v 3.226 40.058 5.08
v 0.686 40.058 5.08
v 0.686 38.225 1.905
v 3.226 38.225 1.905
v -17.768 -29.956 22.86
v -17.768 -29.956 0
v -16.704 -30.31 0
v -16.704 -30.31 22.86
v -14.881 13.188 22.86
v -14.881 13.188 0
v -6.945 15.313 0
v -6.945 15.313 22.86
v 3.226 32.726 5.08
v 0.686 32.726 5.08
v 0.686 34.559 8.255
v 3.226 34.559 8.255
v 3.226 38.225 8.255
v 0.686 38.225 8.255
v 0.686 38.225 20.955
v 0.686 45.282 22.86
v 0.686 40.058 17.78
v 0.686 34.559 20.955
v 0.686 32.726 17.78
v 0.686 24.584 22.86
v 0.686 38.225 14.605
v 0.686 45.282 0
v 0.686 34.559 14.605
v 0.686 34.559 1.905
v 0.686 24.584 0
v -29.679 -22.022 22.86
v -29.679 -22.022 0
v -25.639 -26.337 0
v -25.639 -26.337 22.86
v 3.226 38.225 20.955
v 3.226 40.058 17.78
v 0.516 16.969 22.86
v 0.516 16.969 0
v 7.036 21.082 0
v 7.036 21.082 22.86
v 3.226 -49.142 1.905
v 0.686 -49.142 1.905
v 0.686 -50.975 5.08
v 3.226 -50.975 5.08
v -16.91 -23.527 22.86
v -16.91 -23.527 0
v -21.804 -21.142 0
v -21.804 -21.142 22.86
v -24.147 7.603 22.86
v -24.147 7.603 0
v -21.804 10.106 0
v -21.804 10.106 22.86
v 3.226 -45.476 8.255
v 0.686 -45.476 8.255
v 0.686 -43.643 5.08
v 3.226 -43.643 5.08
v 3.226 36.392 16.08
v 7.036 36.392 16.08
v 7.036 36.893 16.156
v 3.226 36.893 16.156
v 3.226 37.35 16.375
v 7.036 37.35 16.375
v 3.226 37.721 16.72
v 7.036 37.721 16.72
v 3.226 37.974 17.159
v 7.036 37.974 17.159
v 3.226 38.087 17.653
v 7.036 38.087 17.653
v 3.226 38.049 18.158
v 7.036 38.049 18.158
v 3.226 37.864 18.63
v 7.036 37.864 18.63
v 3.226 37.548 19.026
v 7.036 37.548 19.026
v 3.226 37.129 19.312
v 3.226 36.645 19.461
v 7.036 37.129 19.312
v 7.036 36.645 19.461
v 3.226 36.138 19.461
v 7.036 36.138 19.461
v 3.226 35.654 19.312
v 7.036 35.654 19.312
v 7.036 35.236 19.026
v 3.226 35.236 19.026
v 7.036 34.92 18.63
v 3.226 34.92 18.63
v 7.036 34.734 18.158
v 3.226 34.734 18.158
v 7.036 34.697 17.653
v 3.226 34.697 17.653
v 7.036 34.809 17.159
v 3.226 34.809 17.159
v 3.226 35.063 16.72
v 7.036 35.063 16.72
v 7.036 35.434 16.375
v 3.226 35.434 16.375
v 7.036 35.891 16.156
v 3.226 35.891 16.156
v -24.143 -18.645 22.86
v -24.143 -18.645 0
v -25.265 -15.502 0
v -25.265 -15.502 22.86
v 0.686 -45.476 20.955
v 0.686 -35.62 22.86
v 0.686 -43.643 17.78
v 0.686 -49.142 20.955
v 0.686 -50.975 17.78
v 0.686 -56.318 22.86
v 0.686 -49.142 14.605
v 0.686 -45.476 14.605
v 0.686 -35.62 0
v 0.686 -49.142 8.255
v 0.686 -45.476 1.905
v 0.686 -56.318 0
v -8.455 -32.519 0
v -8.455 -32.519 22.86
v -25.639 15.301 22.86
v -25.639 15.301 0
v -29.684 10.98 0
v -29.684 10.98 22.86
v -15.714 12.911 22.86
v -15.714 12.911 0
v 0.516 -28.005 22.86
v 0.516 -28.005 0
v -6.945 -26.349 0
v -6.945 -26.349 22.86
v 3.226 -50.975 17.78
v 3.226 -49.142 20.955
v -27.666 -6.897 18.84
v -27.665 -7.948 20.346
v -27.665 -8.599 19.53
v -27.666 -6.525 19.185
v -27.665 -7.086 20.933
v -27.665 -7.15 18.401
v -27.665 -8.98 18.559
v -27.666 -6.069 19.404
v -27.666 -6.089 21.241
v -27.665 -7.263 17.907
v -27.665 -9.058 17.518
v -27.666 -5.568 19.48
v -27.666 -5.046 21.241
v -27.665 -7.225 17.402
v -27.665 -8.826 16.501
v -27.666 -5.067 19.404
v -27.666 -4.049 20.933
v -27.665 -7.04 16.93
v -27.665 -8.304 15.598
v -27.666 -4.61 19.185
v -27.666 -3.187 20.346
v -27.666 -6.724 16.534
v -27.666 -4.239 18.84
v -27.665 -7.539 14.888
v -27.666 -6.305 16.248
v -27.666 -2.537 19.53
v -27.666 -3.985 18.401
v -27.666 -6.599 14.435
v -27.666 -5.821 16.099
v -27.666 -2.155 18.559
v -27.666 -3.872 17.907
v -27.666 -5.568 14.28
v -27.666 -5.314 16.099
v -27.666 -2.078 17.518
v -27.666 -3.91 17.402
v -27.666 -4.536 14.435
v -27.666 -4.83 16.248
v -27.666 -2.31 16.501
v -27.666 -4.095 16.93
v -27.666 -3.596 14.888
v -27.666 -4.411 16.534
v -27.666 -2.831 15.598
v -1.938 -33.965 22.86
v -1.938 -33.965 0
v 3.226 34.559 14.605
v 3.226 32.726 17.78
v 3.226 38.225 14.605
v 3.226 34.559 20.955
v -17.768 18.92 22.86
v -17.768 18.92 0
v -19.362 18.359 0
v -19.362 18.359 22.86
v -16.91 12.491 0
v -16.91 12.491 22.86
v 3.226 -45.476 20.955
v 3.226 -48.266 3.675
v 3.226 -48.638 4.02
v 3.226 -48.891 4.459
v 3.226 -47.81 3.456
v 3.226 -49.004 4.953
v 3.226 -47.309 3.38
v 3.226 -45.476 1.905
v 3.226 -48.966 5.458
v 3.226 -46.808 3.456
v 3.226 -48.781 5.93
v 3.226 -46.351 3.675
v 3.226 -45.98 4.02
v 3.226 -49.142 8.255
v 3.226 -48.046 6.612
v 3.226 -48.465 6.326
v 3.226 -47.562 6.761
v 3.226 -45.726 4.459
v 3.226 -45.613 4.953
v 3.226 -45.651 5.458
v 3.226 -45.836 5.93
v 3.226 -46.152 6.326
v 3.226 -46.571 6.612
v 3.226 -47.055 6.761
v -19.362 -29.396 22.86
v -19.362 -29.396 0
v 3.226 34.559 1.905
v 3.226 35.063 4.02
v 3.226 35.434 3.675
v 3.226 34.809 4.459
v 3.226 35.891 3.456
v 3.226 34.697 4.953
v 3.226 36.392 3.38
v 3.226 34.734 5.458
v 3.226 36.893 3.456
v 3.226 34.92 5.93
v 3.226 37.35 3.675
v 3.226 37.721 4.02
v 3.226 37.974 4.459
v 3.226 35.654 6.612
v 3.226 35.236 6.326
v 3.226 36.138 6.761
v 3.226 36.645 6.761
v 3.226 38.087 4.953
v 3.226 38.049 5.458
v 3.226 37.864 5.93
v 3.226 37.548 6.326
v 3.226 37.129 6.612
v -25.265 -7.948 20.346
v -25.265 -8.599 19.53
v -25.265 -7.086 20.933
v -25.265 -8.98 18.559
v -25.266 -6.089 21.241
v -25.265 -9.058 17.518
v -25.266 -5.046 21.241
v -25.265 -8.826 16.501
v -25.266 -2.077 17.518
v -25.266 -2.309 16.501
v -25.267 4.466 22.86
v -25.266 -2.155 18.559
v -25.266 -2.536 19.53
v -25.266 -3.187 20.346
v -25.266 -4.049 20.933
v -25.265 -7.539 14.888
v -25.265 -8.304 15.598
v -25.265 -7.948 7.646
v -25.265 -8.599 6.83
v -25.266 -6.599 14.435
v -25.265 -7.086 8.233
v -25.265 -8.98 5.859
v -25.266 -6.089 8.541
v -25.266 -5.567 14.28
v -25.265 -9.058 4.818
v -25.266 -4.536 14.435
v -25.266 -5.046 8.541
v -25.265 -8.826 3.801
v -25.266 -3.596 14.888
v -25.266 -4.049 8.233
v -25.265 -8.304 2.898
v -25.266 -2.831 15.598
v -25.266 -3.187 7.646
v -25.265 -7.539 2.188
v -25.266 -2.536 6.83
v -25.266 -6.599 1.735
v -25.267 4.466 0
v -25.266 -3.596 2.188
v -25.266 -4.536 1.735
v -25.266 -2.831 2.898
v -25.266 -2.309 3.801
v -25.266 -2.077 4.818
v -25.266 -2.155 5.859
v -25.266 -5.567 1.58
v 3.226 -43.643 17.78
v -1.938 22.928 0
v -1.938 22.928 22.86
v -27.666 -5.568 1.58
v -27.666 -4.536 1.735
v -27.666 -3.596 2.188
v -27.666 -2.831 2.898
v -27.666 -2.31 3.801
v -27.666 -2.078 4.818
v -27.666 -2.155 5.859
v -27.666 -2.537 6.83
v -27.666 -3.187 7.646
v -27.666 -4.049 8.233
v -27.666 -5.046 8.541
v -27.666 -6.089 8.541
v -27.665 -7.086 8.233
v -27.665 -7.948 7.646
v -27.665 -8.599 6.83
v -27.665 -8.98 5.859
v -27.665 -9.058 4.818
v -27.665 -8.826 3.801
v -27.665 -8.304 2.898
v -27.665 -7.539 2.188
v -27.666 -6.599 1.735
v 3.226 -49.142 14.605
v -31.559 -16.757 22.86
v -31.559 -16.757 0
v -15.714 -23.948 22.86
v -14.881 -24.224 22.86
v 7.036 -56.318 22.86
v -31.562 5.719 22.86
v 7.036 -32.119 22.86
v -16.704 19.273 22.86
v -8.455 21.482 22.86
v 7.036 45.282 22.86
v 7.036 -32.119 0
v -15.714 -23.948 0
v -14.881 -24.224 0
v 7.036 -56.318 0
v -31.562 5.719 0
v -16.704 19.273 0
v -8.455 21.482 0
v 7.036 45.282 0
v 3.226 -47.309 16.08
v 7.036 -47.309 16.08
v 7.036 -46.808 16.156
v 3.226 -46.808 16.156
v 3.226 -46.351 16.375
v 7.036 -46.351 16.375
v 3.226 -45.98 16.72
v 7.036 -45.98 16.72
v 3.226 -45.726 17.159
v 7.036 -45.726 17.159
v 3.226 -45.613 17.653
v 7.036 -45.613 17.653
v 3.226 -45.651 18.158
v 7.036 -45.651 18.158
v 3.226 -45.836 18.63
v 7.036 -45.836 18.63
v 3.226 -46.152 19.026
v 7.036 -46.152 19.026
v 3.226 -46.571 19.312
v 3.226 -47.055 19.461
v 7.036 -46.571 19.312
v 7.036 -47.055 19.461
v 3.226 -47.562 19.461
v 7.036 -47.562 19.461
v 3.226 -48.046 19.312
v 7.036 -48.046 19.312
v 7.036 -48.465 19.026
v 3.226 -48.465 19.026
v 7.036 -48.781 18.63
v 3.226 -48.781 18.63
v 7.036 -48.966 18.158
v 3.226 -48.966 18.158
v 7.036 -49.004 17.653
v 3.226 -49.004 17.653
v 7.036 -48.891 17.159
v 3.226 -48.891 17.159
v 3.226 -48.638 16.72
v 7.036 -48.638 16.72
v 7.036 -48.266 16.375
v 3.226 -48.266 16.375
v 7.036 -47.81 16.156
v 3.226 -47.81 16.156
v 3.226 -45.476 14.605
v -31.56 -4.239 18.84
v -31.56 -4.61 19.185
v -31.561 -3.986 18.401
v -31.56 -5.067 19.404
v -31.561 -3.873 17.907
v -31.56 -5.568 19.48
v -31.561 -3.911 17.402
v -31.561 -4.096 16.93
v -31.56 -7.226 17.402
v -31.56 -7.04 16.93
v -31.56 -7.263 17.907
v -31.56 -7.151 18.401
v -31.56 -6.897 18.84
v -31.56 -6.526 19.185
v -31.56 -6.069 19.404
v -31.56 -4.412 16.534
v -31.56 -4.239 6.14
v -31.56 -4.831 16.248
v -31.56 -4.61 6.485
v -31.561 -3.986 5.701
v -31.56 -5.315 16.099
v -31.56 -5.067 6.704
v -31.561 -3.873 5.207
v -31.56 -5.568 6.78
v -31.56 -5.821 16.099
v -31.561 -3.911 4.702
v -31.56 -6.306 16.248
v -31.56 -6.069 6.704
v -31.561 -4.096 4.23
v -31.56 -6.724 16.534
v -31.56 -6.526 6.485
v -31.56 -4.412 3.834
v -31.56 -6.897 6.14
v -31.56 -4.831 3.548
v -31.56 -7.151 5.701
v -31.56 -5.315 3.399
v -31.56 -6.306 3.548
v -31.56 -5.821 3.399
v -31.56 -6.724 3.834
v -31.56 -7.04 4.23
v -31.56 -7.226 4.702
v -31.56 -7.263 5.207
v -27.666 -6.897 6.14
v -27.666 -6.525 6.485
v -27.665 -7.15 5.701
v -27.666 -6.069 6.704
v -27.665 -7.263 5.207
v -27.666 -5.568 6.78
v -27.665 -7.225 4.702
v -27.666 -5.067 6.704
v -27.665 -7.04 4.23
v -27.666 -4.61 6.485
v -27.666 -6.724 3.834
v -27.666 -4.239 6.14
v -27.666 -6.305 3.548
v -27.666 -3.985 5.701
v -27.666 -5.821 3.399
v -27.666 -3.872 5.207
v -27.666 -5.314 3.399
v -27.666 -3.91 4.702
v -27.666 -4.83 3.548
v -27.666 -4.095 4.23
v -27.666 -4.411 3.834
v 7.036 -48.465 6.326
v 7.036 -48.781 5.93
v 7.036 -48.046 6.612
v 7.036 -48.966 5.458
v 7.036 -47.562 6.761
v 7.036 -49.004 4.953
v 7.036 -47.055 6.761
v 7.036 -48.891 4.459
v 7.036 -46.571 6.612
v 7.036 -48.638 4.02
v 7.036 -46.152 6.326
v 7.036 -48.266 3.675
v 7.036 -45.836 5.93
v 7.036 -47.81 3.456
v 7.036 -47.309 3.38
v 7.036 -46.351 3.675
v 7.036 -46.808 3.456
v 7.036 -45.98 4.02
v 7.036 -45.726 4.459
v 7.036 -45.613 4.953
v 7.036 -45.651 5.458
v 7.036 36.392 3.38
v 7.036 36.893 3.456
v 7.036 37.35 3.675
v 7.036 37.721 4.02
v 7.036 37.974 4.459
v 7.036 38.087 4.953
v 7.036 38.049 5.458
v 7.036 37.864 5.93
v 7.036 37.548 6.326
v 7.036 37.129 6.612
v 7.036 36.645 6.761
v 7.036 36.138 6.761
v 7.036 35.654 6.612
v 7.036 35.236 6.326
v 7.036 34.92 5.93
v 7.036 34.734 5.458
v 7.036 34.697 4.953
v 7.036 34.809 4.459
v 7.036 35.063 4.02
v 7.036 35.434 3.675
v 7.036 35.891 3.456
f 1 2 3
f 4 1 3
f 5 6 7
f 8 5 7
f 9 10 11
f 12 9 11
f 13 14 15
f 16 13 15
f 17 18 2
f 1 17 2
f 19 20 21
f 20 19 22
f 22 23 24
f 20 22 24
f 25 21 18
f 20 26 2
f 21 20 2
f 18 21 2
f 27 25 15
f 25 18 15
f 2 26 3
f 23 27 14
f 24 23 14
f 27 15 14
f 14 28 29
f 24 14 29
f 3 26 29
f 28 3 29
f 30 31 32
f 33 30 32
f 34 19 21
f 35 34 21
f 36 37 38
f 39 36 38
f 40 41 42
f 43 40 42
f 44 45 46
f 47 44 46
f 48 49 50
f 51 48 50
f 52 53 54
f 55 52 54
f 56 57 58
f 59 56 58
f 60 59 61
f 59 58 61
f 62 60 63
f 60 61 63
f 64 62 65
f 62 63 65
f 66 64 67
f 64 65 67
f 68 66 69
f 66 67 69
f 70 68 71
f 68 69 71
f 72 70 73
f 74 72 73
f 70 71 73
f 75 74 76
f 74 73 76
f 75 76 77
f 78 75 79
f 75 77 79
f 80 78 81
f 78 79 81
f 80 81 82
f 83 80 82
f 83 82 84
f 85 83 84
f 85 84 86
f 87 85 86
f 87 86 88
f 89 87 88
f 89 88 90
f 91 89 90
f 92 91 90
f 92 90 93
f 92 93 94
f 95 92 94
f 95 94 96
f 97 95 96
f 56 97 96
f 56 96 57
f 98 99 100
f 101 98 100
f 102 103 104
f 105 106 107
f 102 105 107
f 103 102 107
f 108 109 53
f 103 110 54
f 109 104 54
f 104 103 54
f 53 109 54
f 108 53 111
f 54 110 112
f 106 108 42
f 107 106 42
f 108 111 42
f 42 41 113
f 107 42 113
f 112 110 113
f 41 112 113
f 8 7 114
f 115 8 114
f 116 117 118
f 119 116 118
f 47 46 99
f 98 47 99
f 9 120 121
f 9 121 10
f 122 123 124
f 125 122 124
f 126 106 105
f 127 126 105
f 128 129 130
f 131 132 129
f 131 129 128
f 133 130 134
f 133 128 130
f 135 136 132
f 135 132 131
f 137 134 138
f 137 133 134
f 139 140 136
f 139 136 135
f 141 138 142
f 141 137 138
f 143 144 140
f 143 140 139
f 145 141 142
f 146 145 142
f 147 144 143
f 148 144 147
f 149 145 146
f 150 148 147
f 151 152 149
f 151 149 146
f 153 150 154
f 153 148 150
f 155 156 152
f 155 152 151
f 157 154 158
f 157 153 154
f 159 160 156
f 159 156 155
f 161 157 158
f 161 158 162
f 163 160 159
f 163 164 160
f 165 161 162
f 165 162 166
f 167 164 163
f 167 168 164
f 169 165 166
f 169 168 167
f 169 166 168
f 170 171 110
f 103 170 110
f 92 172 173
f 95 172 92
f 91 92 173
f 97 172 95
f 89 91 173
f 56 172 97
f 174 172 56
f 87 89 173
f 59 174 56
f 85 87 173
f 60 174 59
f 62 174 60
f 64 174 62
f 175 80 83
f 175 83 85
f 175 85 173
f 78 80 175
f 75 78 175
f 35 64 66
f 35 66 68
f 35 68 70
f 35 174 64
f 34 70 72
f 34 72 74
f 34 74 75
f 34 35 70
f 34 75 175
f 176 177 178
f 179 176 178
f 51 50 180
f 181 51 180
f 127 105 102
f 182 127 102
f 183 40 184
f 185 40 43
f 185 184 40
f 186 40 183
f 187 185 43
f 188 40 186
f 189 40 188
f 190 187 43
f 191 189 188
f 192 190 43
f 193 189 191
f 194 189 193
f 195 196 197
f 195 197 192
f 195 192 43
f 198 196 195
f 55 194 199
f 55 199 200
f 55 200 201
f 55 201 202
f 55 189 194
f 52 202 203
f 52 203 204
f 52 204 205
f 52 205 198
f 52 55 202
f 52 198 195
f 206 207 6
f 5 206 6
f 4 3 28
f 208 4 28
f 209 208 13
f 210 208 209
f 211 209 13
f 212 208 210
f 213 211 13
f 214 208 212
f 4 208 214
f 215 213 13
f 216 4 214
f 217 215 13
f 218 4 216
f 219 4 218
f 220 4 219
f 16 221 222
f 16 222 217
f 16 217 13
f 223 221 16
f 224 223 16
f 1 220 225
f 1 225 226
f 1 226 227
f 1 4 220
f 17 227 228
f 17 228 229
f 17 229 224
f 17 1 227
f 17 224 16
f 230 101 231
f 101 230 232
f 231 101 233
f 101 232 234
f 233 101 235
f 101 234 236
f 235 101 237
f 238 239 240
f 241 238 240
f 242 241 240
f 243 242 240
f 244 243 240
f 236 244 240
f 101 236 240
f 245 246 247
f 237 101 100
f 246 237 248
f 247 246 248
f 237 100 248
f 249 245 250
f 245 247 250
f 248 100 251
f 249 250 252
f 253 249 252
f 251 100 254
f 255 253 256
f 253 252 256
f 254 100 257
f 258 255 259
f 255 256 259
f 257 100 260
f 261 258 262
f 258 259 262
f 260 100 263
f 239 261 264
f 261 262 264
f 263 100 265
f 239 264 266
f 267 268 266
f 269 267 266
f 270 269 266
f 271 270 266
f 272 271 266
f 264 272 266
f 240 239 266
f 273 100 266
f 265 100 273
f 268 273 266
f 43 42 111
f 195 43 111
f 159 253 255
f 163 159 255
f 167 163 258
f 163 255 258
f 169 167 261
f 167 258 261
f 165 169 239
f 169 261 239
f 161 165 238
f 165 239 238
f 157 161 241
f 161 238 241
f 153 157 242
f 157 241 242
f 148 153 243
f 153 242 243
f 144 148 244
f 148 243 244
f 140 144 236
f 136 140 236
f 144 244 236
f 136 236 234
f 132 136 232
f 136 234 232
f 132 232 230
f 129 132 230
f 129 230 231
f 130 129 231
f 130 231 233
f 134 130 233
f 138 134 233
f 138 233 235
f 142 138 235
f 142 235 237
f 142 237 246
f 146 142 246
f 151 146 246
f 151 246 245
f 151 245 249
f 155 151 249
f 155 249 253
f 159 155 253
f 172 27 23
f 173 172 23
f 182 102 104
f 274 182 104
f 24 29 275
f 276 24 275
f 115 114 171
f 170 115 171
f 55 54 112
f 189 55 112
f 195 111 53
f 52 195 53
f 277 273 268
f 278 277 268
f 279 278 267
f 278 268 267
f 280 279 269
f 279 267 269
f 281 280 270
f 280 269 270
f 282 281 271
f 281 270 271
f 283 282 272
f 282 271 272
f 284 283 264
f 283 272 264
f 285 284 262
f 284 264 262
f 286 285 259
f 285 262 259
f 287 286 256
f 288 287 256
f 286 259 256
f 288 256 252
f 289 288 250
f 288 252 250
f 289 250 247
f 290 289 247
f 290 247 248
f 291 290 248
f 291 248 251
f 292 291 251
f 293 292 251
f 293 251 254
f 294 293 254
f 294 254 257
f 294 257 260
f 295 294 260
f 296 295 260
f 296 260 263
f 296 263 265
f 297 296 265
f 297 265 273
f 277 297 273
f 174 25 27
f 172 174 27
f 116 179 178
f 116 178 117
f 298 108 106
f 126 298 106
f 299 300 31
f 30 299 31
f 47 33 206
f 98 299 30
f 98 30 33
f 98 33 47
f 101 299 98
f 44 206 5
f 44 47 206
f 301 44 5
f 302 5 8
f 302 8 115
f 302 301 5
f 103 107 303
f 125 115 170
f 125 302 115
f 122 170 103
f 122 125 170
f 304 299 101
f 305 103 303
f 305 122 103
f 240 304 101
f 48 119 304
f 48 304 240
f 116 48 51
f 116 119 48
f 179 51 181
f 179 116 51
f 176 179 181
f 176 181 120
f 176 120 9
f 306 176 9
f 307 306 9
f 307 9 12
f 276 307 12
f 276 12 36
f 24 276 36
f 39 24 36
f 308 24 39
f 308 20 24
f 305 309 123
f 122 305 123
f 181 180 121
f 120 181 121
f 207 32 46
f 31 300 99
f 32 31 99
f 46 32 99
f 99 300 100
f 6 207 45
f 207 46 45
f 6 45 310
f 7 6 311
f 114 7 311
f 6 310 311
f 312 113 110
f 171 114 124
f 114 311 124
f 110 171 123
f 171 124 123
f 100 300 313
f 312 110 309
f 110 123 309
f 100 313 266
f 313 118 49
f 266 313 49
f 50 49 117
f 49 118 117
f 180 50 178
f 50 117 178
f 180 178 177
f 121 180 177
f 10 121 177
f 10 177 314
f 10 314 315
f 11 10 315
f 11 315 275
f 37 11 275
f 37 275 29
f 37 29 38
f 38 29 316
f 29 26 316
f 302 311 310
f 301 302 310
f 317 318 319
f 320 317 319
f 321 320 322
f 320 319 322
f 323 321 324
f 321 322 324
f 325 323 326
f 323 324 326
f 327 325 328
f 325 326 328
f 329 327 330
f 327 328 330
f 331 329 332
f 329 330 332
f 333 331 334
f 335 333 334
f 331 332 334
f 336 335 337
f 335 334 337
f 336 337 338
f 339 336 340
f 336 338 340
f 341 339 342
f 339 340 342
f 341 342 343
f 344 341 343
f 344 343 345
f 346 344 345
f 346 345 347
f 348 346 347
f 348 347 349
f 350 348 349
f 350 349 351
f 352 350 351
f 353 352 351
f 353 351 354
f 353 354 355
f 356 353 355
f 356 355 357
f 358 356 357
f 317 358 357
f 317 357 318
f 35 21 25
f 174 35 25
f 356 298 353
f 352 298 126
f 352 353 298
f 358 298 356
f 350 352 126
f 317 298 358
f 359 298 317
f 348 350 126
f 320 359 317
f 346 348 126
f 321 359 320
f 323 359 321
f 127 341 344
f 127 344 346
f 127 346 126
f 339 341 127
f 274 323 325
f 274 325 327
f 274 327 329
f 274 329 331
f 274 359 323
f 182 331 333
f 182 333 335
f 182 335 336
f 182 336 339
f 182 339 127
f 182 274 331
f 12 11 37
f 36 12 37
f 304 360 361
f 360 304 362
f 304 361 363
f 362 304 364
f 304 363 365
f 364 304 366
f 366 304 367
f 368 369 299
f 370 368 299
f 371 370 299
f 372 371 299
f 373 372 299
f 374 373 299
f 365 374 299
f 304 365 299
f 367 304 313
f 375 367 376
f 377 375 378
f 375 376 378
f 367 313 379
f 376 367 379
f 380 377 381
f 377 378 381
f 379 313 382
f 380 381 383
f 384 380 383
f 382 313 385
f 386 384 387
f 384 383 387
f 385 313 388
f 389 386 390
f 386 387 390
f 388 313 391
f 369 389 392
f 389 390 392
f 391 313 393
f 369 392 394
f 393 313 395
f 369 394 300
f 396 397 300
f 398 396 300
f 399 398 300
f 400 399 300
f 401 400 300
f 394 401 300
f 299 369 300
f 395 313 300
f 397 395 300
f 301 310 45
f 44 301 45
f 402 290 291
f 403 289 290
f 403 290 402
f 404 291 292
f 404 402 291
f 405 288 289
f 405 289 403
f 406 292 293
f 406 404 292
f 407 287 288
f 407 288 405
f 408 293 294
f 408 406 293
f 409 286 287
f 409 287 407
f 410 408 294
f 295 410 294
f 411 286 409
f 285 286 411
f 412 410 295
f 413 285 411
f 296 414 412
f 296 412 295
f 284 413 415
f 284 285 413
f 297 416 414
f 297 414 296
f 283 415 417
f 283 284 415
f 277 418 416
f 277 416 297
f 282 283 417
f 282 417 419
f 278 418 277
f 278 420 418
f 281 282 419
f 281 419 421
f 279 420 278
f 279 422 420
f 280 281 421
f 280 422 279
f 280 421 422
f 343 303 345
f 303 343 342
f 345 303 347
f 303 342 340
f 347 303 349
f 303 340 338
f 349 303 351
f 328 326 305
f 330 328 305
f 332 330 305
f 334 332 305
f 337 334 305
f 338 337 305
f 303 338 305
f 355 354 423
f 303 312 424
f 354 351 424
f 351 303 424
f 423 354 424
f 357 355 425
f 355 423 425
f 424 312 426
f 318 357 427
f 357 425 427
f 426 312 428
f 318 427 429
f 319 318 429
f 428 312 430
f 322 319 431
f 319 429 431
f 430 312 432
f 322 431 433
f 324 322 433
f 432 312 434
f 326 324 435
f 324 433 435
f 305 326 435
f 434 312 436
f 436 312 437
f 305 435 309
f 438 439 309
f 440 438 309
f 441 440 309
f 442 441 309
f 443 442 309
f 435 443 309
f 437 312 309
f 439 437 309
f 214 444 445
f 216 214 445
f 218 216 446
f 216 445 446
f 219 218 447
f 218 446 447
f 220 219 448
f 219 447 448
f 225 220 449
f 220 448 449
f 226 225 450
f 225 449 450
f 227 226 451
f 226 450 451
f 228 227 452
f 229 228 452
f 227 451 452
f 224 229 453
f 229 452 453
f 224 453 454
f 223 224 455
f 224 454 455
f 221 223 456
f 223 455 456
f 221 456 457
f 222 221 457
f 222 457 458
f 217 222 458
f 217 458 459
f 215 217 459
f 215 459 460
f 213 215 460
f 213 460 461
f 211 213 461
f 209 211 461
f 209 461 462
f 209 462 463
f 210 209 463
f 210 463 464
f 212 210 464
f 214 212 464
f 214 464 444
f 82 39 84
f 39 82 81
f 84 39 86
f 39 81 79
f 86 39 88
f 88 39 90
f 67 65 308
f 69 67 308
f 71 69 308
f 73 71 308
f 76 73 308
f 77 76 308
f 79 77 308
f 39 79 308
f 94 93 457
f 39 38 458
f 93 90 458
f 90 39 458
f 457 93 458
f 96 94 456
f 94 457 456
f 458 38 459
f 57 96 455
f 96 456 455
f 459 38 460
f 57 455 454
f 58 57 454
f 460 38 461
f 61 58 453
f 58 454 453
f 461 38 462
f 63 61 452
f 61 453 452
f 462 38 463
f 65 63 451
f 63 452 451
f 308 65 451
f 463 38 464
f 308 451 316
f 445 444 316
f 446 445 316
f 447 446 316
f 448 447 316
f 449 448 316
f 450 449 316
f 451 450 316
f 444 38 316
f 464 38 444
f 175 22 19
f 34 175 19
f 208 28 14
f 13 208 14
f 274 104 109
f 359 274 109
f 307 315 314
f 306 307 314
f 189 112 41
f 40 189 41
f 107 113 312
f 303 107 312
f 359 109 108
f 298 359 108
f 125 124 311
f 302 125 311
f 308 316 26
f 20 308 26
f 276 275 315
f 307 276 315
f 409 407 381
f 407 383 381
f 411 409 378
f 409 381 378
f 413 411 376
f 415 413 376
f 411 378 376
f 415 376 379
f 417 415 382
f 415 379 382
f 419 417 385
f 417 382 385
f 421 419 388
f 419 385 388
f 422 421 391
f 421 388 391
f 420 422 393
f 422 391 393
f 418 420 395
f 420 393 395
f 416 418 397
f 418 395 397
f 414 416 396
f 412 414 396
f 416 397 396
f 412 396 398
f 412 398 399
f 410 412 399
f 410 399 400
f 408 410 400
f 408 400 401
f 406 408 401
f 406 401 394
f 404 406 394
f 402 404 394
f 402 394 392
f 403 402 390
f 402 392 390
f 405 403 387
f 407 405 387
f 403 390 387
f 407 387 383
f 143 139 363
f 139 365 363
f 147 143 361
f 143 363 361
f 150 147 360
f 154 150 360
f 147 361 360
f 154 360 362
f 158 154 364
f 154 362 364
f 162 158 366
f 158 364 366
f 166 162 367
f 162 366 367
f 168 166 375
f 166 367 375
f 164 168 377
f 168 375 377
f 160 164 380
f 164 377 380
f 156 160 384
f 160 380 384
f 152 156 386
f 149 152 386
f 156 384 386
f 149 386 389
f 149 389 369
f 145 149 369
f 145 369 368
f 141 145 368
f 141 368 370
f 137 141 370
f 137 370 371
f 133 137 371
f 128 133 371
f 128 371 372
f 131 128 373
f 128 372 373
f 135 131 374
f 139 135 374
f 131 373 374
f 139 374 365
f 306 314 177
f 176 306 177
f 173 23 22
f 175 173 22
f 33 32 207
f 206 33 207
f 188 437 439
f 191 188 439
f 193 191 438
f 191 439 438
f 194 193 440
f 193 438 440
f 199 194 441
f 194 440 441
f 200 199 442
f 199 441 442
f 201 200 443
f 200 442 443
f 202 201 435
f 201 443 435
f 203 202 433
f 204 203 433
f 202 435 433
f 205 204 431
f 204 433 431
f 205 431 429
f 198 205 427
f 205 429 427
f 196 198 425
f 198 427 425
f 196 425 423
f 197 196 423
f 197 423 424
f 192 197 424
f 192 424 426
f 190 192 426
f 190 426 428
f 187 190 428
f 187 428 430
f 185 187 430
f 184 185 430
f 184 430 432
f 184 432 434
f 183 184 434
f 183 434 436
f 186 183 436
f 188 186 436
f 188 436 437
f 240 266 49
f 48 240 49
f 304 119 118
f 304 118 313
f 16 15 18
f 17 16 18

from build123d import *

# Parameters (mm, degrees)
BOSS_EXTRUDE1_DEPTH                              = 22.86
M3_CLEARANCE_HOLE1_D                             = 3.4
CBORE_FOR_M3_PAN_HEAD_MACHINE_SCREW1_D           = 3.4
CBORE_FOR_M3_PAN_HEAD_MACHINE_SCREW1_CBORE_D     = 7
CBORE_FOR_M3_PAN_HEAD_MACHINE_SCREW1_CBORE_DEPTH = 2.4
CUT_EXTRUDE1_DEPTH                               = 2.54


with BuildPart() as part:
    # Model → Boss-Extrude1 (new body)
    with BuildSketch(Plane.XY):
        Polygon((-31.561530074, 5.719031337), (-31.559190751, -16.756549884), (-29.679250105, -22.022082599), (-25.638762019, -26.336998537), (-19.362308162, -29.395591134), (-17.768021154, -29.956483893), (-16.704264105, -30.309706307), (-8.455081931, -32.518568858), (-1.9378711, -33.964713672), (0.686481117, -35.620494321), (0.686481117, -56.318132067), (7.036481117, -56.318132067), (7.036481117, -32.118649881), (0.516193039, -28.004809234), (-6.945353494, -26.349119844), (-14.880902119, -24.224238152), (-15.713611559, -23.947735506), (-16.909625113, -23.526960991), (-21.804194775, -21.141777435), (-24.142511039, -18.644643945), (-25.264614821, -15.501739308), (-25.266693071, 4.465531103), (-24.147092478, 7.603487204), (-21.804194775, 10.105513301), (-16.909625113, 12.490696857), (-15.713611559, 12.911471373), (-14.880902119, 13.187974018), (-6.945353494, 15.312855711), (0.516193039, 16.9685451), (7.036481117, 21.082385748), (7.036481117, 45.281867933), (0.686481117, 45.281867933), (0.686481117, 24.584230187), (-1.9378711, 22.928449538), (-8.455081931, 21.482304725), (-16.704264105, 19.273442173), (-17.768021154, 18.92021976), (-19.362308162, 18.359327), (-25.638762019, 15.300734404), (-29.684302801, 10.980422593), align=None)
    extrude(amount=BOSS_EXTRUDE1_DEPTH)

    # M3 Clearance Hole1 (through all)
    with Locations(Plane.ZY.offset(-0.686481117)):
        with Locations((5.08, 36.391867933), (17.78, 36.391867933), (5.08, -47.308730357), (17.78, -47.308730357)):
            Hole(M3_CLEARANCE_HOLE1_D / 2)

    # CBORE for M3 Pan Head Machine Screw1 (through all)
    with Locations(Plane(origin=(-25.266228013, -0.002629781, 0), x_dir=(0, 0, -1), z_dir=(0.999999995, 0.000104083, 0))):
        with Locations((-5.08, -5.564839092), (-17.78, -5.564839092)):
            CounterBoreHole(CBORE_FOR_M3_PAN_HEAD_MACHINE_SCREW1_D / 2, CBORE_FOR_M3_PAN_HEAD_MACHINE_SCREW1_CBORE_D / 2, CBORE_FOR_M3_PAN_HEAD_MACHINE_SCREW1_CBORE_DEPTH)

    # Sketch5 → Cut-Extrude1 (cut)
    with BuildSketch(Plane.ZY.offset(-0.686481117)):
        Polygon((17.78, -43.642556148), (14.605, -45.475643253), (14.605, -49.141817462), (17.78, -50.974904567), (20.955, -49.141817462), (20.955, -45.475643253), align=None)
        Polygon((5.08, -43.642556148), (1.905, -45.475643253), (1.905, -49.141817462), (5.08, -50.974904567), (8.255, -49.141817462), (8.255, -45.475643253), align=None)
        Polygon((17.78, 40.058042143), (14.605, 38.224955038), (14.605, 34.558780829), (17.78, 32.725693724), (20.955, 34.558780829), (20.955, 38.224955038), align=None)
        Polygon((5.08, 40.058042143), (1.905, 38.224955038), (1.905, 34.558780829), (5.08, 32.725693724), (8.255, 34.558780829), (8.255, 38.224955038), align=None)
    extrude(amount=-CUT_EXTRUDE1_DEPTH, mode=Mode.SUBTRACT)


solid = part.part
